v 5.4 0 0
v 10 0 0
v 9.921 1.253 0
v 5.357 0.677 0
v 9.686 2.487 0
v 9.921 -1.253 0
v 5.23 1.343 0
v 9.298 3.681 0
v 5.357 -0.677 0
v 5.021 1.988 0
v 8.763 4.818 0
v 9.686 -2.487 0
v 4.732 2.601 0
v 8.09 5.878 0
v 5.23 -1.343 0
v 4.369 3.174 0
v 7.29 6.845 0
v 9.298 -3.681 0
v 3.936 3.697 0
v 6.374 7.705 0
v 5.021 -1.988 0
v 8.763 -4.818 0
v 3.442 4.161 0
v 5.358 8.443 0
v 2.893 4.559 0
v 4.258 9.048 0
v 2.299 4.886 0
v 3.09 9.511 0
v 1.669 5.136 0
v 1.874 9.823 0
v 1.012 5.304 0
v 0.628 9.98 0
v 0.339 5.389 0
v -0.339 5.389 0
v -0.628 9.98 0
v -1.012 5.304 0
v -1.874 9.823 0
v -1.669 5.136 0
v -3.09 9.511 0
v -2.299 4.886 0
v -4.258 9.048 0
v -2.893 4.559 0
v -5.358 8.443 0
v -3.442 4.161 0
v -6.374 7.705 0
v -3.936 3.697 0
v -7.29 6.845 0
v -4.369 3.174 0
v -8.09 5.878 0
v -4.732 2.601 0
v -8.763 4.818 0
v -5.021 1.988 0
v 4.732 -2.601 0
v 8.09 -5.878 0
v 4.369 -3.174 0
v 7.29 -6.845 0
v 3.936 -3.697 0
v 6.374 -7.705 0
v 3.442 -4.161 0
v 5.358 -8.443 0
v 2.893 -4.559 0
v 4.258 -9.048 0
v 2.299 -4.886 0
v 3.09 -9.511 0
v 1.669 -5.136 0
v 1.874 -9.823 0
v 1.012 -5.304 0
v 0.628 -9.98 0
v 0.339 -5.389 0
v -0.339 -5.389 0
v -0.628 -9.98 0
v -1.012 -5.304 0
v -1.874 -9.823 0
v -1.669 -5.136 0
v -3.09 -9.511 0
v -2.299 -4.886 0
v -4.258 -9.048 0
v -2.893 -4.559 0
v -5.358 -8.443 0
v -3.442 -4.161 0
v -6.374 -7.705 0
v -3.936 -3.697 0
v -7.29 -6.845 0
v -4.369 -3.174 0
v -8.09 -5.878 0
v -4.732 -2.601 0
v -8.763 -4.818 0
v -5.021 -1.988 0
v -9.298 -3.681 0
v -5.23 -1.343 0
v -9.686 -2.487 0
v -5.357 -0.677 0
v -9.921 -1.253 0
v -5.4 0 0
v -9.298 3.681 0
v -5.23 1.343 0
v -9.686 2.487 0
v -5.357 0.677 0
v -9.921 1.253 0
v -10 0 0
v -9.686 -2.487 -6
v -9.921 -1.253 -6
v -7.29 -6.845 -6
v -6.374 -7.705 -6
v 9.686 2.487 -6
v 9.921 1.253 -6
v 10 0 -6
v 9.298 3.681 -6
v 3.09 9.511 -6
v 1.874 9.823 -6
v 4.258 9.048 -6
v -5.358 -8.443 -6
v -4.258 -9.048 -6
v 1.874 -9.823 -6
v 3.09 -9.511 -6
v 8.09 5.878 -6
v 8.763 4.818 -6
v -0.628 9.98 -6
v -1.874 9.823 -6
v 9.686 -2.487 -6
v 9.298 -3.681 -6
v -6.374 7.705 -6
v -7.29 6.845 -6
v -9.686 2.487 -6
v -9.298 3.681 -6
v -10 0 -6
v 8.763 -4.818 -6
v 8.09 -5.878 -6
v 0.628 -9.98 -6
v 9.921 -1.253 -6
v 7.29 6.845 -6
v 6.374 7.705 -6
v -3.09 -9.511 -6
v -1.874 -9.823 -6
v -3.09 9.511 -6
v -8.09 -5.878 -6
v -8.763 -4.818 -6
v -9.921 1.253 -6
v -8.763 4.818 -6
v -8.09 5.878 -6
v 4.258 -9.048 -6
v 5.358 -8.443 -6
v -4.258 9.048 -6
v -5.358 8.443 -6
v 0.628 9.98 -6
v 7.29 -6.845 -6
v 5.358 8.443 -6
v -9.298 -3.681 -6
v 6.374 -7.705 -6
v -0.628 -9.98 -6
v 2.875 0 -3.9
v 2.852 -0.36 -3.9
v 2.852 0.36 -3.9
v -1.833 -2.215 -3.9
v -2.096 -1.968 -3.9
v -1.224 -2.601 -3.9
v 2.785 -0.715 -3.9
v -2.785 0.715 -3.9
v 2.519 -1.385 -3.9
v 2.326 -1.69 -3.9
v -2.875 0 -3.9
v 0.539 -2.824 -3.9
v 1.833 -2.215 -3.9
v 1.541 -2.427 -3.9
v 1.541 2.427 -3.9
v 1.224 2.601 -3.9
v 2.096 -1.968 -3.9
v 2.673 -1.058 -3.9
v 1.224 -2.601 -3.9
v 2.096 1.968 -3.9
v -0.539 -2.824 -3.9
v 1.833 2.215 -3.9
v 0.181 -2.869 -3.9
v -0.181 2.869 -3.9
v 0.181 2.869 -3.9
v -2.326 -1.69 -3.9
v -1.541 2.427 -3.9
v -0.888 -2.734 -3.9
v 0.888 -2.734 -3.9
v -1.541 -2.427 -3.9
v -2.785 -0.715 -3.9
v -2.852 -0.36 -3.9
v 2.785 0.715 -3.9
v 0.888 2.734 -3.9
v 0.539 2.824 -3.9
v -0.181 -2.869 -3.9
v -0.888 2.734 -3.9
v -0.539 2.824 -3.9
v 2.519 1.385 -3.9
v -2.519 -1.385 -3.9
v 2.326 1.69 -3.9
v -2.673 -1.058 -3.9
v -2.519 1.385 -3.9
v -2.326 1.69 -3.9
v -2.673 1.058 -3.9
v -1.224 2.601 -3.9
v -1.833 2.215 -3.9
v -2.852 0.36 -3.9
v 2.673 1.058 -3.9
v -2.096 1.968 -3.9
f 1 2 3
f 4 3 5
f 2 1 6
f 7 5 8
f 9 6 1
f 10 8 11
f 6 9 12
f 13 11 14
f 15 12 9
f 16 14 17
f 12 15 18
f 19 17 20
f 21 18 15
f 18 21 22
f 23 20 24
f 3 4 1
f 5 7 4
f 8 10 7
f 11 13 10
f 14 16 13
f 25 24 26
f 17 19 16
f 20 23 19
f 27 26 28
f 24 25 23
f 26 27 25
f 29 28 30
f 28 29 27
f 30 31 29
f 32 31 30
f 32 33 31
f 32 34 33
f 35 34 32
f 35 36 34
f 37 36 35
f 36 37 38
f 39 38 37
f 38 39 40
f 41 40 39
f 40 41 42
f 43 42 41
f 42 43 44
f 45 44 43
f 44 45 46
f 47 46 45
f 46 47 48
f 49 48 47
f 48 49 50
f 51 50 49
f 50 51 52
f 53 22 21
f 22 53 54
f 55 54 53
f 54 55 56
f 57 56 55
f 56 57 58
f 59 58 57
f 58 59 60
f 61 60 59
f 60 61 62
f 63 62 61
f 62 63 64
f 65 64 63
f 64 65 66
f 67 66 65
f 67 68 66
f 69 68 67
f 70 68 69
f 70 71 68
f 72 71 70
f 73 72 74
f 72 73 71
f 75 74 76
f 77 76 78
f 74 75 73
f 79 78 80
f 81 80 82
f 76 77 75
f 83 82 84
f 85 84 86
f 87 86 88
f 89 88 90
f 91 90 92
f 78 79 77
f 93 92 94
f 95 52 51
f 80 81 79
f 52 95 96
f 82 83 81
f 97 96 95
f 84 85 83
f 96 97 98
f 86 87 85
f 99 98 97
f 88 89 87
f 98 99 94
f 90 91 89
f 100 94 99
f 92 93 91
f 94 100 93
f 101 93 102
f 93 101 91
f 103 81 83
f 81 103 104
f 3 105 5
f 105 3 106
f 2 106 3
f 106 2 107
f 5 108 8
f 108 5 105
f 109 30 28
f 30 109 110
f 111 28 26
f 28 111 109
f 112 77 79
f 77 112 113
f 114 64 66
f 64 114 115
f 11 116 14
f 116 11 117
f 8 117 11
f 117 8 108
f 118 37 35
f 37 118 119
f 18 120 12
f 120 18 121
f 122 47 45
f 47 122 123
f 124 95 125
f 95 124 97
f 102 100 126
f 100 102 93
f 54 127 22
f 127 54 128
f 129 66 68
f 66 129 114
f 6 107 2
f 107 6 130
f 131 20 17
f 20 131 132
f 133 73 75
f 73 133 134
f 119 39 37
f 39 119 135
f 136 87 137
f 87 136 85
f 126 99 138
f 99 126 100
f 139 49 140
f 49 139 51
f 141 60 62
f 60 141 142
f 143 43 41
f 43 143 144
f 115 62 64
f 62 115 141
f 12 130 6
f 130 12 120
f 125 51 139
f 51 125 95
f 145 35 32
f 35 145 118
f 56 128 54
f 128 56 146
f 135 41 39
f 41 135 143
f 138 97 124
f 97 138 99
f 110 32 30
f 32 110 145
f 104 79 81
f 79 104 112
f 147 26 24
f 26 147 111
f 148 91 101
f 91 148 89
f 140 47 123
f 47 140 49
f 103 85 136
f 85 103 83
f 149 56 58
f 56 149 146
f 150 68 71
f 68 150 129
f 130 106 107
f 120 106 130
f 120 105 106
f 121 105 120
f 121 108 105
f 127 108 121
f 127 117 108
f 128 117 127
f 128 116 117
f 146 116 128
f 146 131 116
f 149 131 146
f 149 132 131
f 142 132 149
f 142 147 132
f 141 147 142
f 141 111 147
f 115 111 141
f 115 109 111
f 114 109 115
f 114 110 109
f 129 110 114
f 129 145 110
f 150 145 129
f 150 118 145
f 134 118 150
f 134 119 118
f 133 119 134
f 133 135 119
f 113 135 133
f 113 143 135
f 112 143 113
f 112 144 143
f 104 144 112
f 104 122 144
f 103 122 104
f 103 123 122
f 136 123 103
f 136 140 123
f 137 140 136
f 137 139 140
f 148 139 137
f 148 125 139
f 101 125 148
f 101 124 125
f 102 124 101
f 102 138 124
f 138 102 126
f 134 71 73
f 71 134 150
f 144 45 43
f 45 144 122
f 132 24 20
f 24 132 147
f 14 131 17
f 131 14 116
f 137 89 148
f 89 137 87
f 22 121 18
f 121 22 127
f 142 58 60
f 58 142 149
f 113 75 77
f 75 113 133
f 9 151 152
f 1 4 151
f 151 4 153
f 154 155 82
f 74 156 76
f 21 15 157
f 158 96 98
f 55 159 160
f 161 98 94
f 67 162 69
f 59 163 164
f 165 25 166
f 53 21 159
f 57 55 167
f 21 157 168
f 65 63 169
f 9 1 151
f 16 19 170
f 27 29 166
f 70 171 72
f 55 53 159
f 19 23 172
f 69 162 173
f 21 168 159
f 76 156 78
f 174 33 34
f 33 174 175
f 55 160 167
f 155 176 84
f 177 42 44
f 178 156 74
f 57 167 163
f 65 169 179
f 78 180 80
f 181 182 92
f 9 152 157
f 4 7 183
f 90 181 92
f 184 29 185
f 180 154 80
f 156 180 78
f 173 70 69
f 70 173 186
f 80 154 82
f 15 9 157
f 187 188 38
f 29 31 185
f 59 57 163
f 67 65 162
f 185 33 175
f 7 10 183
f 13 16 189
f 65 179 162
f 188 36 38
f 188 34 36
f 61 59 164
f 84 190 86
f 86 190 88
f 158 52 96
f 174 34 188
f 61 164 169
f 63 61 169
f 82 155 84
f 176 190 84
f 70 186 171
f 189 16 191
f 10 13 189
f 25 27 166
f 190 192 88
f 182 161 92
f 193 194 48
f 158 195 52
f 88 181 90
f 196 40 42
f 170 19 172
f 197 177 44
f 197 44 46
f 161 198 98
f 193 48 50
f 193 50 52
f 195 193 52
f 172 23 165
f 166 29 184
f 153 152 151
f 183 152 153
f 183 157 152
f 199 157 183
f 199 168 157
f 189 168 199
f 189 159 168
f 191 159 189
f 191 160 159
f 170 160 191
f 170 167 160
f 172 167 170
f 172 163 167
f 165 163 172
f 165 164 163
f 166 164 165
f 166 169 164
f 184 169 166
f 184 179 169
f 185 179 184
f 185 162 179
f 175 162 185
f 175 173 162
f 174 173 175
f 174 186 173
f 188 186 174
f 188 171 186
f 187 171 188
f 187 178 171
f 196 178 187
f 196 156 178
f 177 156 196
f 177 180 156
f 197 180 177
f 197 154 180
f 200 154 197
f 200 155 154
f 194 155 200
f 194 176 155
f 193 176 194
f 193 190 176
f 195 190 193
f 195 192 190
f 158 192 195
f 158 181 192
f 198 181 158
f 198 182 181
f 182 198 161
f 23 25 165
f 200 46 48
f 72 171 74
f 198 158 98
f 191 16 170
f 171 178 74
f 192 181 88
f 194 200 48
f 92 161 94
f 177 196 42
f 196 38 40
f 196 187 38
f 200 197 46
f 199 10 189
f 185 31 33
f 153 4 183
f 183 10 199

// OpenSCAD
$fn = 50;


difference() {
	union() {
		translate(v = [0, 0, -3.0000000000]) {
			cylinder(h = 3, r = 7.0000000000);
		}
		translate(v = [0, 0, -6.0000000000]) {
			cylinder(h = 6, r = 10.0000000000);
		}
	}
	union() {
		translate(v = [0, 0, 0]) {
			rotate(a = [0, 0, 0]) {
				difference() {
					union() {
						#translate(v = [0, 0, -3.0000000000]) {
							cylinder(h = 3, r = 2.6000000000);
						}
						#translate(v = [0, 0, -3.9000000000]) {
							cylinder(h = 3.9000000000, r1 = 2.8750000000, r2 = 5.4000000000);
						}
						#translate(v = [0, 0, -3.0000000000]) {
							cylinder(h = 3, r = 2.8750000000);
						}
						#translate(v = [0, 0, -3.0000000000]) {
							cylinder(h = 3, r = 2.6000000000);
						}
					}
					union();
				}
			}
		}
	}
}
